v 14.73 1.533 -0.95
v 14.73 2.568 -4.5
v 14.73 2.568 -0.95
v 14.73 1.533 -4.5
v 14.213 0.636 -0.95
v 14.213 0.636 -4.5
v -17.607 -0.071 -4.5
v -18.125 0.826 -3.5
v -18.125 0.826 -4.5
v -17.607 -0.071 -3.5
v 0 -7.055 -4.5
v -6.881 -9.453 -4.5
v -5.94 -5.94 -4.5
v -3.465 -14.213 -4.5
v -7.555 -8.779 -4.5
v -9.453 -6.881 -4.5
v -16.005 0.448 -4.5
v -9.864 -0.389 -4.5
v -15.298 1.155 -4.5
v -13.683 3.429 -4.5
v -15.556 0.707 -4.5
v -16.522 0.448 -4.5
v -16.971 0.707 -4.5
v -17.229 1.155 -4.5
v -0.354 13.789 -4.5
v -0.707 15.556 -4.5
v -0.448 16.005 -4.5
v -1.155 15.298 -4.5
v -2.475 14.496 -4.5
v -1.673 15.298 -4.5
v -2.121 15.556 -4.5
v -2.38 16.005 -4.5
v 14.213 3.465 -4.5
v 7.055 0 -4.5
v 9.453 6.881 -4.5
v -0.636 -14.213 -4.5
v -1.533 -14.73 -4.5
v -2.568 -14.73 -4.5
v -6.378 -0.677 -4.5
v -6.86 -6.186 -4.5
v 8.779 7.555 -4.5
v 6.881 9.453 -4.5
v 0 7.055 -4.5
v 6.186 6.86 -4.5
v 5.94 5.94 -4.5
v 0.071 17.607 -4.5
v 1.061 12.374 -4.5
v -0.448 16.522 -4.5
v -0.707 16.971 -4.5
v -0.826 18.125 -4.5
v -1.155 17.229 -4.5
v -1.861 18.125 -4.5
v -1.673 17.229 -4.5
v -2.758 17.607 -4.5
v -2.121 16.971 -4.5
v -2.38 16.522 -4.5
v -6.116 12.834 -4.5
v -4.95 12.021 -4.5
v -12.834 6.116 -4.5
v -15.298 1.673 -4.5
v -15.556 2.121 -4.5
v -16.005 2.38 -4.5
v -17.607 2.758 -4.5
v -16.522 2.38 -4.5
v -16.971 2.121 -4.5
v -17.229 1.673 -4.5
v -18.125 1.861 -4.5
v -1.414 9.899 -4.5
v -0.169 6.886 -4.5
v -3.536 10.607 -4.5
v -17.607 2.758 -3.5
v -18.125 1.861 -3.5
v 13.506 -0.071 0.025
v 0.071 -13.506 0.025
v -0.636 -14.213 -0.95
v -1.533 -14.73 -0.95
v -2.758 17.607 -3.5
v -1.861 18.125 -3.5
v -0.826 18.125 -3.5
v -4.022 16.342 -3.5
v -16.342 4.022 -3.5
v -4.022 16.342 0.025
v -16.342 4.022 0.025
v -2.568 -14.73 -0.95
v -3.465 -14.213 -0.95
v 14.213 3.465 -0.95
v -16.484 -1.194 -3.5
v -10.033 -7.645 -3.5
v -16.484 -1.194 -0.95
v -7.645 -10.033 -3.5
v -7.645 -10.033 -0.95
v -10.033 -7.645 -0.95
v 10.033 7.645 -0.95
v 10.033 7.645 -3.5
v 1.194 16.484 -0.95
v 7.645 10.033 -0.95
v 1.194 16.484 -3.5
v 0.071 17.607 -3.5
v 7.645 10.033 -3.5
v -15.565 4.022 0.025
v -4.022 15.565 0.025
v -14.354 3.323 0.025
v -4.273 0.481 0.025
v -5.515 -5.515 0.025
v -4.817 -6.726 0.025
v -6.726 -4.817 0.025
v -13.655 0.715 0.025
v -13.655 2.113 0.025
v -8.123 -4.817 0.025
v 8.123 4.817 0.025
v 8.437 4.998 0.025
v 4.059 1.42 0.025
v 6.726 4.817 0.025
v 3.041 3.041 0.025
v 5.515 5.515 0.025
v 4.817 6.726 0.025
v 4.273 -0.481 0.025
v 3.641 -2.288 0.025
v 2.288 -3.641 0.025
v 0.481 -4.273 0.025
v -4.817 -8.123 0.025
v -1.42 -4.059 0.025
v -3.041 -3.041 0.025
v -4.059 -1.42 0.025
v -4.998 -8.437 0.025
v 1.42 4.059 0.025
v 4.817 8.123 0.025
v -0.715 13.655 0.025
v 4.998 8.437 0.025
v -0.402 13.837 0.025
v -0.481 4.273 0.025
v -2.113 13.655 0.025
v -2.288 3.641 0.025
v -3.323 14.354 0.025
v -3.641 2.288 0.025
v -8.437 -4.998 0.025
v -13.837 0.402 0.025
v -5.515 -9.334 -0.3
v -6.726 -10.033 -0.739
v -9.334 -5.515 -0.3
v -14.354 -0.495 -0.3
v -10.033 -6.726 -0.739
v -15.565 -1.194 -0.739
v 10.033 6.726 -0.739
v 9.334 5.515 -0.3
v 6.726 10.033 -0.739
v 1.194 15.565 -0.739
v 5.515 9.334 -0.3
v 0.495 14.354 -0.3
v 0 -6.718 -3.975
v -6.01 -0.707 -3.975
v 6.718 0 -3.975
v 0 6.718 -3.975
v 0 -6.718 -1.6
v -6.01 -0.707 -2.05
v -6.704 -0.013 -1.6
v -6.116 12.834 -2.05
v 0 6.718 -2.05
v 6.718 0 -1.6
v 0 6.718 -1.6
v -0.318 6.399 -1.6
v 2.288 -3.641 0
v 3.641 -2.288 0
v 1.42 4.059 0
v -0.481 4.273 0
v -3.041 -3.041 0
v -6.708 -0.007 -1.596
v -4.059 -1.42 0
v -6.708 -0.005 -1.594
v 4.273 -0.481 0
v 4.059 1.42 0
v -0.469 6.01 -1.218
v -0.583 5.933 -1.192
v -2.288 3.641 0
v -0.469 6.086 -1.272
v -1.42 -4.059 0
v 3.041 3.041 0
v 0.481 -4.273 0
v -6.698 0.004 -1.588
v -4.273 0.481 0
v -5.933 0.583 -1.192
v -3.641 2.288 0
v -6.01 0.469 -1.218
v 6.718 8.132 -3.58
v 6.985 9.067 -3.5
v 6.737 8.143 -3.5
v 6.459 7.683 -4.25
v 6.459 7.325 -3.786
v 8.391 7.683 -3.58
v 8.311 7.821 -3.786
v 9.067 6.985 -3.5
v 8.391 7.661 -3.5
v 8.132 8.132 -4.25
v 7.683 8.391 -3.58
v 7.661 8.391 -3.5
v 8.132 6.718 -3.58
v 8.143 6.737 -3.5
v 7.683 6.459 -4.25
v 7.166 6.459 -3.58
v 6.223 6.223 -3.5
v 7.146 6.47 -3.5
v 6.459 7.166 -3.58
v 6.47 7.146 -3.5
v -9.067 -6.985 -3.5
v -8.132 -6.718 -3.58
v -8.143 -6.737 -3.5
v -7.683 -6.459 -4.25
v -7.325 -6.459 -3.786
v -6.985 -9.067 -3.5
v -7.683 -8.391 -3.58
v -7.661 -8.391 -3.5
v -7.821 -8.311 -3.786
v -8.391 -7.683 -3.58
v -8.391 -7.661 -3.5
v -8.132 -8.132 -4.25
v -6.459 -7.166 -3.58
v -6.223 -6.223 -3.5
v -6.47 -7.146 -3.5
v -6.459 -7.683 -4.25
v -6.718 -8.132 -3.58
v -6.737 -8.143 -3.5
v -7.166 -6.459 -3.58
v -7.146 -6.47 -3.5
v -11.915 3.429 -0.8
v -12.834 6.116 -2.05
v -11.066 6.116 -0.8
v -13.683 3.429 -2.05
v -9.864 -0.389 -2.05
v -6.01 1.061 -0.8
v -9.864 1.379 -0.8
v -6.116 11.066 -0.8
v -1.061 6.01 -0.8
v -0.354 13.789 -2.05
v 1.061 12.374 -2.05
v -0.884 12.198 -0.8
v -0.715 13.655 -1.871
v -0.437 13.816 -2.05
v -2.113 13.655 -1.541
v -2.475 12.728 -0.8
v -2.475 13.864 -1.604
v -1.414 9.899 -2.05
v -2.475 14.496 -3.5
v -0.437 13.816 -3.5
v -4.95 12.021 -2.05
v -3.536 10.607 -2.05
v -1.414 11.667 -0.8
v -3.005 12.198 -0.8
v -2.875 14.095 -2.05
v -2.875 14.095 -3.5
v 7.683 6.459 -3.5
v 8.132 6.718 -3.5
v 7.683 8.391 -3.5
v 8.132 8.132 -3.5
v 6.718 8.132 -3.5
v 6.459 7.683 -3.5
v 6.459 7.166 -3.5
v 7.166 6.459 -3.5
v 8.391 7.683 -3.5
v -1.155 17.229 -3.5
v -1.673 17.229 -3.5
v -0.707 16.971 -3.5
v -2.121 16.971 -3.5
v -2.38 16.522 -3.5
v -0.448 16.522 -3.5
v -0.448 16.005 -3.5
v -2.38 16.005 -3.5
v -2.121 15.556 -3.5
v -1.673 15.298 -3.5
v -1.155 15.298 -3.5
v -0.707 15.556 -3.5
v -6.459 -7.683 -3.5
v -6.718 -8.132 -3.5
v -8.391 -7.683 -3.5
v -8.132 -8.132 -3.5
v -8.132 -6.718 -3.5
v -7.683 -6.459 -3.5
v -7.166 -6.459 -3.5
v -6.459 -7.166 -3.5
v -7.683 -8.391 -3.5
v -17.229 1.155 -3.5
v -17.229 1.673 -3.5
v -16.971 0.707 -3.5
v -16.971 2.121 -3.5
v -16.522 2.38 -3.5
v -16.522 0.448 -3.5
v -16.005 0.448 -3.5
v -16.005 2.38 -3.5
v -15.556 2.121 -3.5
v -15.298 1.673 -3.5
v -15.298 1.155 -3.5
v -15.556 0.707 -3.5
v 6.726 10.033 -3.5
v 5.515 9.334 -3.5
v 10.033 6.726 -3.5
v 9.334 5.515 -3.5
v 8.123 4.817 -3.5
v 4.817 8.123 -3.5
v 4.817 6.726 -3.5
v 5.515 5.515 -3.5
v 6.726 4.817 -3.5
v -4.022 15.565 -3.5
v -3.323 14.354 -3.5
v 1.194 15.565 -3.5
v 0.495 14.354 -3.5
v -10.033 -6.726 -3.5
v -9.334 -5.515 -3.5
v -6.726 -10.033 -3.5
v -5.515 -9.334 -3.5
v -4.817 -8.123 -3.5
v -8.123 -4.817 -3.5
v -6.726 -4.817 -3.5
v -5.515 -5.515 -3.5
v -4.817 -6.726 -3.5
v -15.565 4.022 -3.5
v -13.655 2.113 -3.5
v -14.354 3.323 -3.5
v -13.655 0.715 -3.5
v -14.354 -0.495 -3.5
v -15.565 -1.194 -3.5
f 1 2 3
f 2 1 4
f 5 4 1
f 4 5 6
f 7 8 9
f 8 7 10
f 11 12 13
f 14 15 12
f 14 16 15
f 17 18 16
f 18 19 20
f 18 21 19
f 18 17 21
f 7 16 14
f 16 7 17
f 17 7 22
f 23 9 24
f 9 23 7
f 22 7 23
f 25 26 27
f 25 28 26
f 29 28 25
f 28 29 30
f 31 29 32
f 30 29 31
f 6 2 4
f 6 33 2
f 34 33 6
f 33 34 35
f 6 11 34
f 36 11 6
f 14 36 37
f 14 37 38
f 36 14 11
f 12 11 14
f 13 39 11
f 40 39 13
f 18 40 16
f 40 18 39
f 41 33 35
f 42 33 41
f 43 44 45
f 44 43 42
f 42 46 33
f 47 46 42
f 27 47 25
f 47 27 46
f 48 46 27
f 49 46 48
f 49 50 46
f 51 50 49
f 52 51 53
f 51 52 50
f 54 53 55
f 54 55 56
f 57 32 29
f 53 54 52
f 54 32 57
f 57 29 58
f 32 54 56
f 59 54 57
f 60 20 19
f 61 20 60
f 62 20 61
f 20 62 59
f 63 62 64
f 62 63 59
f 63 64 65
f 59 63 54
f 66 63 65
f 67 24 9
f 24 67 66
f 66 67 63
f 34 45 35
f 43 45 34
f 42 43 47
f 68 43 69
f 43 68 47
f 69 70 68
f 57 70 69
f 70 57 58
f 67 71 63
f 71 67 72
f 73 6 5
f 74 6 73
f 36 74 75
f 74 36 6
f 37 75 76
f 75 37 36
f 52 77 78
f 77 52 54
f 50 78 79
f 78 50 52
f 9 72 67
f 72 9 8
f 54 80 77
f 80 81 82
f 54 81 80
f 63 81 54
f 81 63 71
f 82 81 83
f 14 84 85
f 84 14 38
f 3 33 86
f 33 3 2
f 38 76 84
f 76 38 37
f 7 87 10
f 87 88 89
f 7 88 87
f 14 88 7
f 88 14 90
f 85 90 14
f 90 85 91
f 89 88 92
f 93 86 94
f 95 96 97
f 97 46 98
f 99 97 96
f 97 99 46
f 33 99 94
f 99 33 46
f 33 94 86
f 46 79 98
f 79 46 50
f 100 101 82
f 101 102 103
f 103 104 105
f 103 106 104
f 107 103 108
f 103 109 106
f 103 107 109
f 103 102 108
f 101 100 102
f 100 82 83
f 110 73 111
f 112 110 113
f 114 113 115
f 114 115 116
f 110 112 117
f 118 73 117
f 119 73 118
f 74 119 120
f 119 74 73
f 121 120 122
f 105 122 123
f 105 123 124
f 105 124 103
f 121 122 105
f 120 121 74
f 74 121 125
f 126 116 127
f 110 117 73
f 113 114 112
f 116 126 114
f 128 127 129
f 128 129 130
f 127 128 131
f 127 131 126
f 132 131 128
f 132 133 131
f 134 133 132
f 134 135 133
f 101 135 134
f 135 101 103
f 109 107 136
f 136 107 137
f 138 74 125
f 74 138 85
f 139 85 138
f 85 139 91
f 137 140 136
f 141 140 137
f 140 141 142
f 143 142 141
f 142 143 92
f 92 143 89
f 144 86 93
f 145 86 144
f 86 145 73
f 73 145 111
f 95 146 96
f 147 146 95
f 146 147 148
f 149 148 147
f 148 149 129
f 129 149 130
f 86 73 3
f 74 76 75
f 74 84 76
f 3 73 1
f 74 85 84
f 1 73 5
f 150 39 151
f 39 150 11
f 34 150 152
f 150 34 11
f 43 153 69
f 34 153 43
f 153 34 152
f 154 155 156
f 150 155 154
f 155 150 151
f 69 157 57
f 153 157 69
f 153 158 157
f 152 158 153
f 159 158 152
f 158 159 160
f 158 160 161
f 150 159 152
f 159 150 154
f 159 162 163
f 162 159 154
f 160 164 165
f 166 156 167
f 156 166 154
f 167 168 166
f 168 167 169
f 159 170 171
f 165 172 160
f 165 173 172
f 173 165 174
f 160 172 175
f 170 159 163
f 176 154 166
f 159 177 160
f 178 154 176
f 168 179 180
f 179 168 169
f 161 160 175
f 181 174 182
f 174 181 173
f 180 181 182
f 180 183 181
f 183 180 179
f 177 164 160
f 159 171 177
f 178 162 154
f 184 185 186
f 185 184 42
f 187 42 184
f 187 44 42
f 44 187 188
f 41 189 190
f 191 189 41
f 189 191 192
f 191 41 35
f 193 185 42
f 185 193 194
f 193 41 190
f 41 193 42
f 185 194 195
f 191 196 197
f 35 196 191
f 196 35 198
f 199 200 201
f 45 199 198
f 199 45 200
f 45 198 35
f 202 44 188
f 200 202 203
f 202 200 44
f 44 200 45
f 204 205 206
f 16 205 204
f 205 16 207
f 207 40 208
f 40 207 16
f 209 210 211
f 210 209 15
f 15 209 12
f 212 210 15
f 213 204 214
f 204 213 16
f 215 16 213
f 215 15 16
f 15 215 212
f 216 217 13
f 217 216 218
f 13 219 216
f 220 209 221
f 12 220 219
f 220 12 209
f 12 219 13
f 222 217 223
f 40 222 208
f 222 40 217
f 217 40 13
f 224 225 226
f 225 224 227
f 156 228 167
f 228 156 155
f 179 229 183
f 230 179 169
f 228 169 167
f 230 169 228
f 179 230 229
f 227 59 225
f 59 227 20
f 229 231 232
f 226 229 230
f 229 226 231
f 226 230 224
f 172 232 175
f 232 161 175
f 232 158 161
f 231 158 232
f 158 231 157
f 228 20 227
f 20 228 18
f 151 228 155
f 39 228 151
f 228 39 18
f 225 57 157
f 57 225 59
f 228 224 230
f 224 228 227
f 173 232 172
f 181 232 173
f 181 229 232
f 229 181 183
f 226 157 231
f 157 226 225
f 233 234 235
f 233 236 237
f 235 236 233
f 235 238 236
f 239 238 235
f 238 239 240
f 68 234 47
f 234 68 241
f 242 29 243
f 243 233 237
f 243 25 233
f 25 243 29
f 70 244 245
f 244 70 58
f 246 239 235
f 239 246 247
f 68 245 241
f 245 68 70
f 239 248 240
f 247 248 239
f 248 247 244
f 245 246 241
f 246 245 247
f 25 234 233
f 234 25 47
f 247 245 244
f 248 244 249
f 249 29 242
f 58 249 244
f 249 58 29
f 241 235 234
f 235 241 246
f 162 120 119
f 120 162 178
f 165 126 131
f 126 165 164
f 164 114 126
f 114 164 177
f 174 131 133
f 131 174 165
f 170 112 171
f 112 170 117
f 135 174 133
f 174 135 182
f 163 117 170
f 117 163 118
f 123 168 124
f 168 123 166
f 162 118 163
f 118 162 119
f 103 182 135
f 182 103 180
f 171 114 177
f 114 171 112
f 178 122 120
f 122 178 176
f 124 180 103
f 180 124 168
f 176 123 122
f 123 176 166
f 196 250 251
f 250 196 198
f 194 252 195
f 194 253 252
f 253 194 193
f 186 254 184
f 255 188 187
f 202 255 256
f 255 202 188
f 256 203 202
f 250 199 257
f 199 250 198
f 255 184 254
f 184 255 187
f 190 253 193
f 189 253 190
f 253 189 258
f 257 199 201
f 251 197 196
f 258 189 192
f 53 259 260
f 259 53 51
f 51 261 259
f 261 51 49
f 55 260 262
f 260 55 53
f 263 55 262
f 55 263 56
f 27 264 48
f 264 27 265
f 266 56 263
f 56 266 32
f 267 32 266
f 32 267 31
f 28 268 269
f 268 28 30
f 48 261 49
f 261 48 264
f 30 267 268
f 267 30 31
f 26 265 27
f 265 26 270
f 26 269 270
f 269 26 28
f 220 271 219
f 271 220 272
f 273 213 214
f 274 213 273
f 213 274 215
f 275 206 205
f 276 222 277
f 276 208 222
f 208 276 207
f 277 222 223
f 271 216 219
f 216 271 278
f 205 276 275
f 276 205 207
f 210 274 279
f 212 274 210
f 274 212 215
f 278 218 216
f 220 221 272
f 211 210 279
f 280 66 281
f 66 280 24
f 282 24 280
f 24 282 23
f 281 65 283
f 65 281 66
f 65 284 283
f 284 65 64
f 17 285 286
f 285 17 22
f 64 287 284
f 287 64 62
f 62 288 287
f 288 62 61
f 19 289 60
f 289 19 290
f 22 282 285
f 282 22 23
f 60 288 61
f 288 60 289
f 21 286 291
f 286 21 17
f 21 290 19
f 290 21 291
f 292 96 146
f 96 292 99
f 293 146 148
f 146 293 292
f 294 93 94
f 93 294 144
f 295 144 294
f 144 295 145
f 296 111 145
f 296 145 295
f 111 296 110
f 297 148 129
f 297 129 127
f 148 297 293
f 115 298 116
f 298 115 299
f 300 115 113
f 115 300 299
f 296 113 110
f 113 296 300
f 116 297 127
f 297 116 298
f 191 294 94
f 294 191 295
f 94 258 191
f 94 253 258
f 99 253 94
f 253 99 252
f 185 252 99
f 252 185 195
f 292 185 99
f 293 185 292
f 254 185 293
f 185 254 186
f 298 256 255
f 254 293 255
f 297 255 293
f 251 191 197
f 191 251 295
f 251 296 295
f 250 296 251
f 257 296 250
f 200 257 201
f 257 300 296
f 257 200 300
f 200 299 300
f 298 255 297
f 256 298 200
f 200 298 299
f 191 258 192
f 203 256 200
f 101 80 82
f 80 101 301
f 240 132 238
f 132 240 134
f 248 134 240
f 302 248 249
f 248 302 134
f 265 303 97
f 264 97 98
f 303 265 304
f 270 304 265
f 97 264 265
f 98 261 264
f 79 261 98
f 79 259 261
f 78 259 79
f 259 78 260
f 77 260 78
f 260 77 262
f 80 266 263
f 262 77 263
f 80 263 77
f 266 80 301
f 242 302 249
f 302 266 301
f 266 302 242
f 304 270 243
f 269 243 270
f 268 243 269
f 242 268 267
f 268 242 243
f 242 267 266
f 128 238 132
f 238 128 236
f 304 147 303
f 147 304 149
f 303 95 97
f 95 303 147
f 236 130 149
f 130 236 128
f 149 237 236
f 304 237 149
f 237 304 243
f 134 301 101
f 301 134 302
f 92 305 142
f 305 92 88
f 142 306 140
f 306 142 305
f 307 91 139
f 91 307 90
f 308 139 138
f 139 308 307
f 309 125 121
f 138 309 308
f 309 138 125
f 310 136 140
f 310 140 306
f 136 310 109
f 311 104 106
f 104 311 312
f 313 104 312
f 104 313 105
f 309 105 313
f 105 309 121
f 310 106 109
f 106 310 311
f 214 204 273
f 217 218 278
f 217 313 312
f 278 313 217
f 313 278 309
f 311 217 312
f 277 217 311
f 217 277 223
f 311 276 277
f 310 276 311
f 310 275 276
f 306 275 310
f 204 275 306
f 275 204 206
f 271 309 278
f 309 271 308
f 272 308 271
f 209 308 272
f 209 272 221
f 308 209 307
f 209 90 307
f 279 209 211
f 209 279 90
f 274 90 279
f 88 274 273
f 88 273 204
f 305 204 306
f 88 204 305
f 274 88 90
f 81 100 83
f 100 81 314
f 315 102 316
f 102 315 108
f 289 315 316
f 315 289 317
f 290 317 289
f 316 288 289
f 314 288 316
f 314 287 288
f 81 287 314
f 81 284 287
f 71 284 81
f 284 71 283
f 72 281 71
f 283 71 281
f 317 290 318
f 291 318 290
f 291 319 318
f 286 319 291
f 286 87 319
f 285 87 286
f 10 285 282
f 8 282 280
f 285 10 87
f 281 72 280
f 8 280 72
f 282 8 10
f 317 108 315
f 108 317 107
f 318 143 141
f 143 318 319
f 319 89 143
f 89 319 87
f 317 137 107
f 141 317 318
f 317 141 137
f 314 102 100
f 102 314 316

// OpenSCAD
/******************************************************************
*                                                                 *
* OpenFlexure Microscope: Raspberry Pi Camera v2 push-fit mount   *
*                                                                 *
* This is part of the OpenFlexure microscope, an open-source      *
* microscope and 3-axis translation stage.  It gets really good   *
* precision over a ~10mm range, by using plastic flexure          *
* mechanisms.                                                     *
*                                                                 *
* This file provides two parts for the microscope; the bit that   *
* fits onto the camera (picam2_camera_mount) and a cover that     *
* protects the PCB (picam_cover).  The former is part of the      *
* optics module in optics.scad, and the latter is printed         *
* directly.                                                       *
*                                                                 *
* The fit is set by one main function, picam2_push_fit().  It's   *
* designed to be subtracted from a solid block, with the bottom   *
* of the block at z=0.  It grips the plastic camera housing with  *
* four slightly flexible fingers, which ensures the camera pops   *
* in easily but is held relatively firmly.  Two screw holes are   *
* also provided that should self-tap with M2 or similar screws.   *
* I recommend you use these for extra security if the camera is   *
* likely to be handled a lot.                                     *
*                                                                 *
* (c) Richard Bowman, January 2016                                *
* Released under the CERN Open Hardware License                   *
*                                                                 *
******************************************************************/


use <../utilities.scad>;

d=0.05; //small distance!

function picamera_2_camera_mount_height() = 4.5;
bottom = picamera_2_camera_mount_height() * -1;

function picamera_2_camera_sensor_height() = 2; //Height of the sensor above the PCB

module picam2_flex_and_components(cw=8.5+1){
    // A 2D perimeter inside which the flex and components of the camera sit.
    // NB this should fit both v1 and v2 of the module
    // cw is the width of the camera module's casing, nominally 8 or 8.5mm but
    // deliberately printed a bit generous to ensure it fits easily without 
    // damaging the flex.
    
    translate([-cw/2,cw/2-1]) square([cw,13.4-cw/2+1]); //flex (also clears v1 connector)
    translate([-cw/2-2.5,6.7]) square([cw+2.5, 5.4]); //connector
}

module picam1_led(){
    // v1 of the camera module has an LED on board that we should make a cut-out for
    translate([5,10]) square([3.5,2]);
    translate([6,8]) square([3.5,2]);
}
    
module picam2_cutout( beam_length=15){
    // This module is designed to be subtracted from the bottom of a shape.
    // The z=0 plane should be the print bed.
    // It includes cut-outs for the components on the PCB and also a push-fit hole
    // for the camera module.  This uses flexible "fingers" to grip the camera firmly
    // but gently.  Just push to insert, and wiggle to remove.  You may find popping 
    // off the brown ribbon cable and removing the PCB first helps when extracting
    // the camera module again.
    cw = 8.5 + 1.0; //size of camera box sides (NB deliberately loose fitting)
    ch=2.9; //height of camera box (including foam support)
    camera = [cw,cw,ch]; //size of camera box
    hole_r = 4.3; //size of camera aperture
	union(){
        sequential_hull(){
            //cut-out for camera
            translate([0,0,-d]) cube([cw+0.5,cw+0.5,d],center=true); //wider at bottom
            translate([0,0,0.5]) cube([cw,cw,d],center=true);
            translate([0,0,ch/2]) cube([cw,cw,ch],center=true);//for pi-camera its positionia is as it and for dashcam fit position its need to be [cw+6,cw+6,ch]
            cylinder(r=hole_r, h=2*picamera_2_camera_mount_height(), center=true);
        }
            
        //clearance for the ribbon cable at top of camera
        fh=2.5; // the height of the flex
        mh = picamera_2_camera_mount_height();
        
        dz = mh-fh-0.75; // extra height above the flex for the sloping "roof"
        rw = cw - 2*dz; 
        hull(){
            //For dashcam-camera position to be centered these two line need to be comment and for pi-camera position need to be as it is.
            translate([0,0,-d]) linear_extrude(fh) picam2_flex_and_components(cw);
            translate([0,0,-d]) linear_extrude(fh+dz) offset(-dz) picam2_flex_and_components(cw);
        }
        //clearance for the LED/resistor on v1 of the camera
        hull(){
            translate([0,0,-d]) linear_extrude(fh) picam1_led();
            translate([0,0,-d]) linear_extrude(fh+dz) offset(-dz) picam1_led();
        }
        
        //beam clearance
        cylinder(r=hole_r, h=beam_length);
        
        //chamfered screw holes for mounting
        sx = 21/2; //position of screw holes
        reflect([1,0,0]) translate([sx,0,0]) rotate(60){
            //cylinder(r1=3, r2=0,h=4, center=true); //chamfered bottom
            //deformable_hole_trylinder(1.5/2,2.1/2,h=12, center=true);
           cylinder(r1=3.1, r2=1.1, h=5, $fn=3, center=true);
            //These two line below of translate are for dashcam-camera position  of screw holes inorder to use this you might need to comment reflect([1,0,0]) translate([sx,0,0])and cylinder(r1=3.1, r2=1.1, h=5, $fn=3, center=true);
                       //translate([sx-1.5,-6,0]) cylinder(r1=3.1, r2=1.1, h=6, $fn=3, center=true);
              // translate([-sx+1,5.5,0]) cylinder(r1=3.1, r2=1.1, h=6, $fn=3, center=true);   
            cylinder(r=1.1, h=20, $fn=3, center=true);
        }
	}
}
//picam2_cutout();

module picam2_board(h=d){
    // a rounded rectangle with the dimensions of the picamera board v2
    // centred on the origin
    b = 24;
    w = 25;
    roc = 2;
    linear_extrude(h) hull(){
        reflect([1,0]) reflect([0,1]) translate([w/2-roc, b/2-roc]) circle(r=roc,$fn=12);
    }
}

module picamera_2_camera_mount(counterbore=false){
    // A mount for the pi camera v2
    // This should finish at z=0+d, with a surface that can be
    // hull-ed onto the lens assembly.
    b = 24;
    w = 25;
    difference(){
        rotate(45) translate([0,2.4,0]) sequential_hull(){
            translate([0,0,bottom]) picam2_board(h=d);
            translate([0,0,-1]) picam2_board(h=d);
            translate([0,0,0]) cube([w-(-1.5-bottom)*2,b,d],center=true);
        }
        rotate(45) translate([0,0,bottom]) picam2_cutout();
        if(counterbore){
            translate([0,0,bottom-1]) picamera_2_bottom_mounting_posts(height=999, radius=1, cutouts=false);
            translate([0,0,bottom+1])  picamera_2_bottom_mounting_posts(height=999, radius=2.7, cutouts=false);
        }
    }
}
difference(){
    picamera_2_camera_mount(counterbore=true);
    //rotate([90,0,0]) cylinder(r=999,h=999,$fn=4);
}

module picamera_2_bottom_mounting_posts(height=-1, radius=-1, outers=true, cutouts=true){
    // posts to mount to pi camera from below
    r = radius > 0 ? radius : 2;
    h = height > 0 ? height : 4;
    rotate(45)
    reflect([1,0,0]) for(y=[0,12.5]) translate([21/2, y, 0]) difference(){
        if(outers) cylinder(r=r, h=h, $fn=12);
        if(cutouts) intersection(){
            cylinder(h=13, d=2*1.7, center=true, $fn=3);
            rotate(60) cylinder(h=999, d=2*1.7*1.4, center=true, $fn=3);
        }
    }
}

/////////// Cover for camera board //////////////
module picamera_2_cover(){
    // A cover for the camera PCB, slips over the bottom of the camera
    // mount.  This version should be compatible with v1 and v2 of the board
    b = 24;
    w = 25;
    h = 3;
    t = 1; //wall thickness
    centre_y=2.4;
    difference(){
        union(){
            //bottom and sides
            difference(){
                translate([-w/2,-b/2+centre_y,0]) cube([w, b, h]);
                // cut out centre to form walls on 3 sides
                translate([-w/2+t,-b/2+centre_y-t,0.75]) cube([w-2*t, b, h]);
                //chamfer the connector edge for ease of access
                translate([-999,-b/2+centre_y,h]) rotate([-135,0,0]) cube([9999,999,999]);
            }
            //mounting screws
            reflect([1,0,0]) translate([21/2, 0, 0]) cylinder(r=3, h=h, $fn=16);
        }
        //counterbore the mounting screws
        reflect([1,0,0]) translate([21/2, 0, h-1]) rotate(90) intersection(){
           cylinder(r=2, h=999, $fn=16, center=true);
            hole_from_bottom(r=1.1, h=999, base_w=999);
        }
    }
} 
//picam_cover();

pcb = [25.4+0.5,24+0.5,2]; //size of the picam PCB (+0.5mm so it fits)
camera_housing = [9,9,2.5]; //size of the plastic housing
camera_housing_y = 2.5; //shift of the camera housing from the centre
lens_unscrew_r = 5.5/2; //size of the bit we unscrew
    
module generous_camera_bits(){
    //The other stuff on the PCB (mostly the ribbon cable)
    camera = [8.5,8.5,2.3]; //size of camera box
	cw = camera[0]+1; //side length of camera box at bottom (slightly larger)
	union(){
		//ribbon cable at top of camera
        sequential_hull(){
            translate([0,0,0]) cube([cw-1,d,4],center=true);
            translate([0,9.4-(4.4/1)/2,0]) cube([cw-1,1,4],center=true);
        }
        //flex connector
        translate([-1.25,9.4,0]) cube([cw-1+2.5, 4.4+1, 4],center=true);
        
	}
}

module picamera_2_gripper(){
    // this little bit of plastic grips the plastic camera housing
    // and allows you to safely unscrew the lens
    // it protects the (surprisingly delicate) flex that connects the camera to the PCB.
    outer = pcb+[4,-5,camera_housing[2]]; //size of the tool
    difference(){
        translate([0,-1,outer[2]/2]) cube(outer, center=true);
        
        //central hole for the camera housing
        translate([0,camera_housing_y,0]) cube(camera_housing + [0,0,999],center=true);
        
        //cut-outs for the other bits (cable etc.)
        translate([0,camera_housing_y,camera_housing[2]]) rotate([180,0,0]) generous_camera_bits();
        
        //indent for PCB
        translate([0,0,outer[2]]) cube(pcb + [0,0,pcb[2]],center=true);
    
    }
}

module picamera_2_lens_gripper(){
    //a tool to unscrew the lens from the pi camera
    inner_r = 4.7/2;
    union(){
        difference(){
            cylinder(r=7,h=2);
            cylinder(r=5,h=999,center=true);
        }
        for(a=[0,90,180,270]) rotate(a) translate([inner_r,0,0]) cube([1.5,5,2]);
    }
}
